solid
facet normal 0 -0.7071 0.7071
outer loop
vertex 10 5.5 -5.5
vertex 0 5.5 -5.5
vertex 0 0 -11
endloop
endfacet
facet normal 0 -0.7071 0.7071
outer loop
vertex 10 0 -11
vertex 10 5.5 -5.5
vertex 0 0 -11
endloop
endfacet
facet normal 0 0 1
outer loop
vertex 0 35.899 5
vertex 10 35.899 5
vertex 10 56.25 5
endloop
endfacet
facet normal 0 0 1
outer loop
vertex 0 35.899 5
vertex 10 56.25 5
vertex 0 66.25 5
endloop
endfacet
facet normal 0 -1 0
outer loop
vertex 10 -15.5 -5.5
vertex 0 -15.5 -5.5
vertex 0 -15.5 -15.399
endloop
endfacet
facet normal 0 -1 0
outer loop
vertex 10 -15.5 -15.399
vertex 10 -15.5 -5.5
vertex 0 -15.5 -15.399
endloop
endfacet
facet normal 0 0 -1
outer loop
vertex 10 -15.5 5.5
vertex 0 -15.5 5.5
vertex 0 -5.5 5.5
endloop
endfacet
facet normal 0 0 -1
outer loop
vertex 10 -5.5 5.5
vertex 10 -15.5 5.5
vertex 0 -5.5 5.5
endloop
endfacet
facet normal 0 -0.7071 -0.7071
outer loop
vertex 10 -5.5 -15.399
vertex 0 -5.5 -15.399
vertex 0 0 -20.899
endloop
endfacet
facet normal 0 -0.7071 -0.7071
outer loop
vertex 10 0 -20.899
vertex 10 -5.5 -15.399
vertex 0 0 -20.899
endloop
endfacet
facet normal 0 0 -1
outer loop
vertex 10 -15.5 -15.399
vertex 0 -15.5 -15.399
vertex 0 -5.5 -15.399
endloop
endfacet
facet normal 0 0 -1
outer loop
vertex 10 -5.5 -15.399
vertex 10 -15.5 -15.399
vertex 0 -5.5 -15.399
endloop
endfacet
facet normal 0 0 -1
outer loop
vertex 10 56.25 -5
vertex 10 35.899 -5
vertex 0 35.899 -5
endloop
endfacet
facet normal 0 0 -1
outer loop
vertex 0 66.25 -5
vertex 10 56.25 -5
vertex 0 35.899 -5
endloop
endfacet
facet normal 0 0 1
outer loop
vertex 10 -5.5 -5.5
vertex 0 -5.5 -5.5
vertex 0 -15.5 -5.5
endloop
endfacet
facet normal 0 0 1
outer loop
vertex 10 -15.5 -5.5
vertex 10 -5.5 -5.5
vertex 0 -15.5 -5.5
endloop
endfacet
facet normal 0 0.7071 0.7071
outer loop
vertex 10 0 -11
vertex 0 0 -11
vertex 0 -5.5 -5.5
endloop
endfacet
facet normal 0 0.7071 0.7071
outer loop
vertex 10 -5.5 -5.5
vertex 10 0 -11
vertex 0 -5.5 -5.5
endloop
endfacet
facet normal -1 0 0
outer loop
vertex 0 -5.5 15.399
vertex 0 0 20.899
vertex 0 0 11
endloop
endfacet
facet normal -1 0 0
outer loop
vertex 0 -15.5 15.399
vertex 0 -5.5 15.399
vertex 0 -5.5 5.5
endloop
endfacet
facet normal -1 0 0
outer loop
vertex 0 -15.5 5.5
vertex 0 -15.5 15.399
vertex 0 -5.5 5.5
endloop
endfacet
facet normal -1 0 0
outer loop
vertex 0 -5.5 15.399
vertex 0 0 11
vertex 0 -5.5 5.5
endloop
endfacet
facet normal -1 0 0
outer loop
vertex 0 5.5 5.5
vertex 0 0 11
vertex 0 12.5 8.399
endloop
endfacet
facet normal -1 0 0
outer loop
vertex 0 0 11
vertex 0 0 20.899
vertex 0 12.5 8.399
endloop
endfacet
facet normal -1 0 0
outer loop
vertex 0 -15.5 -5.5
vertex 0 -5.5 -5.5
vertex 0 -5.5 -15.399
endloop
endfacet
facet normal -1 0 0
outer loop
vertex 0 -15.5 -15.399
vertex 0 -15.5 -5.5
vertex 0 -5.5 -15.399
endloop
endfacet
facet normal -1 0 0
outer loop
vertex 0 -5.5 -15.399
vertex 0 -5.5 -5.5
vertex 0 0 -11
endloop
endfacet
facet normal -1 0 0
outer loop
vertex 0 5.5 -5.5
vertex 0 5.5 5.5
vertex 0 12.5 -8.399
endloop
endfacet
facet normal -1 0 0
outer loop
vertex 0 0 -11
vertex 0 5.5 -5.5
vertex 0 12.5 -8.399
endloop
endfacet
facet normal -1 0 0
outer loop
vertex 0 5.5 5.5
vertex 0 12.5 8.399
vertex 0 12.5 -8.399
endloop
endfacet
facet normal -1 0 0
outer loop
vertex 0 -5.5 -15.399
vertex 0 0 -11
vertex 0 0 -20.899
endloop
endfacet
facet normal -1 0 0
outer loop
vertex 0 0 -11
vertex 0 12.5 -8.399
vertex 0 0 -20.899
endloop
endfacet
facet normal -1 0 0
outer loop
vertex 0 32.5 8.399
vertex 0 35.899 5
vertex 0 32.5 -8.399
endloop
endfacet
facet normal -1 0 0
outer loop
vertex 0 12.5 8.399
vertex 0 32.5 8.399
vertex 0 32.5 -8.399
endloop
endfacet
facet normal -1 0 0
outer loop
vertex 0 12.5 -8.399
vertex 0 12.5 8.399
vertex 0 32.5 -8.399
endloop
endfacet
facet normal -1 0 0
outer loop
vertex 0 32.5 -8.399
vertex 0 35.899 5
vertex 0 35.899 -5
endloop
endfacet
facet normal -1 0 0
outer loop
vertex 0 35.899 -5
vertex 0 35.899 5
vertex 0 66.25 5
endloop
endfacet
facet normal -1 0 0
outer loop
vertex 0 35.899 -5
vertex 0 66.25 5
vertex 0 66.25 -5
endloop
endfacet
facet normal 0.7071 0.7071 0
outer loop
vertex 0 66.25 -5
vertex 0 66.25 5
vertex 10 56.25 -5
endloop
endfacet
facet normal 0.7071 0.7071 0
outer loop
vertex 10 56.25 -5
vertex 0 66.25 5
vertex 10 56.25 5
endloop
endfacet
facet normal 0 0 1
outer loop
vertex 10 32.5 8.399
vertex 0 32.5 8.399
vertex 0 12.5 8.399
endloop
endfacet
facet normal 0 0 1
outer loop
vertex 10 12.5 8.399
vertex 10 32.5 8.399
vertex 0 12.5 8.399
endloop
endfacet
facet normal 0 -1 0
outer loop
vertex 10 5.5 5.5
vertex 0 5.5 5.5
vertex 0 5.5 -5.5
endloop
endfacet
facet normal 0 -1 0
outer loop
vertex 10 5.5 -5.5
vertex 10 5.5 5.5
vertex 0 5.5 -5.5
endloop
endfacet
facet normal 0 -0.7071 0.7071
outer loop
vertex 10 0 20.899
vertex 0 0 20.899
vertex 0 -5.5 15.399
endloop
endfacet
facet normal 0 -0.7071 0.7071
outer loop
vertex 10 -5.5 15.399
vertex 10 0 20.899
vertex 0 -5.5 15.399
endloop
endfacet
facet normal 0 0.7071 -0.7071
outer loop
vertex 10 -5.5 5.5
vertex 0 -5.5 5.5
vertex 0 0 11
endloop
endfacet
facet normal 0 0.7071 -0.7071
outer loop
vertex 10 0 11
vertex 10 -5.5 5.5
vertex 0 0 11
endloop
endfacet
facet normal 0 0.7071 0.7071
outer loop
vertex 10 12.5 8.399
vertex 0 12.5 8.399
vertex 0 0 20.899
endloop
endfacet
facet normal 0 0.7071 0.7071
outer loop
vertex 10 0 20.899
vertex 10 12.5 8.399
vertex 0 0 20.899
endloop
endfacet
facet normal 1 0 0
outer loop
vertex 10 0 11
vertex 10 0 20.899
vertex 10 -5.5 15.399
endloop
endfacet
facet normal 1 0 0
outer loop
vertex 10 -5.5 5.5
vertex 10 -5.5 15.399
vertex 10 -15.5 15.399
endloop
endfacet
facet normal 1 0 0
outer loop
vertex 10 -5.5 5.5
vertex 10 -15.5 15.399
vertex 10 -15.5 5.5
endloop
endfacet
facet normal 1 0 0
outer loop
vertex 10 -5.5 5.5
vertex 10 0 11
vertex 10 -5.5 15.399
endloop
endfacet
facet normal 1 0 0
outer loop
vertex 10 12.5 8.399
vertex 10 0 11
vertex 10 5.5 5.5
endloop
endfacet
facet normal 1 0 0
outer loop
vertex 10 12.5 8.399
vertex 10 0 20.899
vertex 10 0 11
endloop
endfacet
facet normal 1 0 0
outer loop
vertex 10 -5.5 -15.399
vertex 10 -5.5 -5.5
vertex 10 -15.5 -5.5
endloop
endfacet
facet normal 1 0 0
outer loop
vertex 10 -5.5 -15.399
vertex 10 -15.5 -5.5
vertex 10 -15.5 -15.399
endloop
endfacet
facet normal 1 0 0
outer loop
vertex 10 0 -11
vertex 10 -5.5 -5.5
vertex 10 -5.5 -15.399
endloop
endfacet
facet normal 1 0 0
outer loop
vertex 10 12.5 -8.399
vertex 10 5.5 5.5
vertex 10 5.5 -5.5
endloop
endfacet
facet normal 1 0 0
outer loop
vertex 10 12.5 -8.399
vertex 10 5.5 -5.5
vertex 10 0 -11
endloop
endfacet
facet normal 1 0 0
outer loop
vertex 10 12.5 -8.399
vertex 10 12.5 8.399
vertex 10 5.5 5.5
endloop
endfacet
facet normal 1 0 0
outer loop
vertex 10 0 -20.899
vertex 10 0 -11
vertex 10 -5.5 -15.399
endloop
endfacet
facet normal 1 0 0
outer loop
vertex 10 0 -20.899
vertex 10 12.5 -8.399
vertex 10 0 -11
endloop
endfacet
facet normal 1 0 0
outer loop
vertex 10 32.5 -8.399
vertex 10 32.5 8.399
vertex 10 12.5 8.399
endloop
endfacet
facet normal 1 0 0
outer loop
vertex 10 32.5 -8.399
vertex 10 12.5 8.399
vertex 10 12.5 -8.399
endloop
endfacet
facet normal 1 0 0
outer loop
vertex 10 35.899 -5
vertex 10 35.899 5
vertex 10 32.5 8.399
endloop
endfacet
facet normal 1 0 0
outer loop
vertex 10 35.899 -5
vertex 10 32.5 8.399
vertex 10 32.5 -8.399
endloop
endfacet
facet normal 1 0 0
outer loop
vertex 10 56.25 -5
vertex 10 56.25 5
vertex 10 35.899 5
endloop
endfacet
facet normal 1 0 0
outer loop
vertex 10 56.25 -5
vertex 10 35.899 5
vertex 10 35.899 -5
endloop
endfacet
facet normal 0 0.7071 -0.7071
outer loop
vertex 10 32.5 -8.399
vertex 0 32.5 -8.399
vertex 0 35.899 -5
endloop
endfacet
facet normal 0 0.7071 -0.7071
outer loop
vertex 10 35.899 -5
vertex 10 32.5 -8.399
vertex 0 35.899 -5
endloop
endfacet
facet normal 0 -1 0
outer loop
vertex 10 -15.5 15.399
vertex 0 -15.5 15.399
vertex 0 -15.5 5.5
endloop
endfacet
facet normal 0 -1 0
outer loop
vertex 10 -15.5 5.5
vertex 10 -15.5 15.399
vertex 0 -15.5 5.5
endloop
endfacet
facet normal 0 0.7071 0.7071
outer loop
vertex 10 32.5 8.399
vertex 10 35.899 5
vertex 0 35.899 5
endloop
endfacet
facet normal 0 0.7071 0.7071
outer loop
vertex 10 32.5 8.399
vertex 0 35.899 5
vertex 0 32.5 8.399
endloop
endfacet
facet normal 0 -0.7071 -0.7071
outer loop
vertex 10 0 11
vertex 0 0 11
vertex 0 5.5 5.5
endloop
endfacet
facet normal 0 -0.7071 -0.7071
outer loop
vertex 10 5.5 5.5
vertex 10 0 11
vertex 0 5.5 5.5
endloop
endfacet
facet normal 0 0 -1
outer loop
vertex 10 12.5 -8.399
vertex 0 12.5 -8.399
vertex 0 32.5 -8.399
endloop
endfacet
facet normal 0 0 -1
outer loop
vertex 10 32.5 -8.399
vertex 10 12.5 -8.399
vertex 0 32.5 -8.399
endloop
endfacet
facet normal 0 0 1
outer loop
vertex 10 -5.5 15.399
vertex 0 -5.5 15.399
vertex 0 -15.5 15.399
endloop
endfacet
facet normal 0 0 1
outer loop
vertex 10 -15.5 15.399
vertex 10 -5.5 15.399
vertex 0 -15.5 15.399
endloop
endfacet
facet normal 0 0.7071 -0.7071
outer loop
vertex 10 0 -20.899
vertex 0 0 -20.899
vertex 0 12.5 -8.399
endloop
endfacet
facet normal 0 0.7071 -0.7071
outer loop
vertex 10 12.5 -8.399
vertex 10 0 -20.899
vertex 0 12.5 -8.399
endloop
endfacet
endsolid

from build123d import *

# Parameters (mm, degrees)
BOSS_EXTRUDE1_DEPTH = 10
BOSS_EXTRUDE2_DEPTH = 5


with BuildPart() as part:
    # Sketch1 → Boss-Extrude1 (new body)
    with BuildSketch(Plane(origin=(0, 0, 0), x_dir=(0, 0, -1), z_dir=(1, 0, 0))):
        Polygon((5.5, 5.5), (11, 0), (5.5, -5.5), (5.5, -15.5), (15.399494937, -15.5), (15.399494937, -5.5), (20.899494937, 0), (8.399494937, 12.5), (8.399494937, 32.5), (0, 40.899494937), (-8.399494937, 32.5), (-8.399494937, 12.5), (-20.899494937, 0), (-15.399494937, -5.5), (-15.399494937, -15.5), (-5.5, -15.5), (-5.5, -5.5), (-11, 0), (-5.5, 5.5), align=None)
    extrude(amount=BOSS_EXTRUDE1_DEPTH)

    # Sketch2 → Boss-Extrude2 (add, symmetric)
    with BuildSketch(Plane.XY):
        Polygon((0, 6.25), (0, 66.25), (10, 56.25), (10, 6.25), align=None)
    extrude(amount=BOSS_EXTRUDE2_DEPTH, both=True)


solid = part.part
